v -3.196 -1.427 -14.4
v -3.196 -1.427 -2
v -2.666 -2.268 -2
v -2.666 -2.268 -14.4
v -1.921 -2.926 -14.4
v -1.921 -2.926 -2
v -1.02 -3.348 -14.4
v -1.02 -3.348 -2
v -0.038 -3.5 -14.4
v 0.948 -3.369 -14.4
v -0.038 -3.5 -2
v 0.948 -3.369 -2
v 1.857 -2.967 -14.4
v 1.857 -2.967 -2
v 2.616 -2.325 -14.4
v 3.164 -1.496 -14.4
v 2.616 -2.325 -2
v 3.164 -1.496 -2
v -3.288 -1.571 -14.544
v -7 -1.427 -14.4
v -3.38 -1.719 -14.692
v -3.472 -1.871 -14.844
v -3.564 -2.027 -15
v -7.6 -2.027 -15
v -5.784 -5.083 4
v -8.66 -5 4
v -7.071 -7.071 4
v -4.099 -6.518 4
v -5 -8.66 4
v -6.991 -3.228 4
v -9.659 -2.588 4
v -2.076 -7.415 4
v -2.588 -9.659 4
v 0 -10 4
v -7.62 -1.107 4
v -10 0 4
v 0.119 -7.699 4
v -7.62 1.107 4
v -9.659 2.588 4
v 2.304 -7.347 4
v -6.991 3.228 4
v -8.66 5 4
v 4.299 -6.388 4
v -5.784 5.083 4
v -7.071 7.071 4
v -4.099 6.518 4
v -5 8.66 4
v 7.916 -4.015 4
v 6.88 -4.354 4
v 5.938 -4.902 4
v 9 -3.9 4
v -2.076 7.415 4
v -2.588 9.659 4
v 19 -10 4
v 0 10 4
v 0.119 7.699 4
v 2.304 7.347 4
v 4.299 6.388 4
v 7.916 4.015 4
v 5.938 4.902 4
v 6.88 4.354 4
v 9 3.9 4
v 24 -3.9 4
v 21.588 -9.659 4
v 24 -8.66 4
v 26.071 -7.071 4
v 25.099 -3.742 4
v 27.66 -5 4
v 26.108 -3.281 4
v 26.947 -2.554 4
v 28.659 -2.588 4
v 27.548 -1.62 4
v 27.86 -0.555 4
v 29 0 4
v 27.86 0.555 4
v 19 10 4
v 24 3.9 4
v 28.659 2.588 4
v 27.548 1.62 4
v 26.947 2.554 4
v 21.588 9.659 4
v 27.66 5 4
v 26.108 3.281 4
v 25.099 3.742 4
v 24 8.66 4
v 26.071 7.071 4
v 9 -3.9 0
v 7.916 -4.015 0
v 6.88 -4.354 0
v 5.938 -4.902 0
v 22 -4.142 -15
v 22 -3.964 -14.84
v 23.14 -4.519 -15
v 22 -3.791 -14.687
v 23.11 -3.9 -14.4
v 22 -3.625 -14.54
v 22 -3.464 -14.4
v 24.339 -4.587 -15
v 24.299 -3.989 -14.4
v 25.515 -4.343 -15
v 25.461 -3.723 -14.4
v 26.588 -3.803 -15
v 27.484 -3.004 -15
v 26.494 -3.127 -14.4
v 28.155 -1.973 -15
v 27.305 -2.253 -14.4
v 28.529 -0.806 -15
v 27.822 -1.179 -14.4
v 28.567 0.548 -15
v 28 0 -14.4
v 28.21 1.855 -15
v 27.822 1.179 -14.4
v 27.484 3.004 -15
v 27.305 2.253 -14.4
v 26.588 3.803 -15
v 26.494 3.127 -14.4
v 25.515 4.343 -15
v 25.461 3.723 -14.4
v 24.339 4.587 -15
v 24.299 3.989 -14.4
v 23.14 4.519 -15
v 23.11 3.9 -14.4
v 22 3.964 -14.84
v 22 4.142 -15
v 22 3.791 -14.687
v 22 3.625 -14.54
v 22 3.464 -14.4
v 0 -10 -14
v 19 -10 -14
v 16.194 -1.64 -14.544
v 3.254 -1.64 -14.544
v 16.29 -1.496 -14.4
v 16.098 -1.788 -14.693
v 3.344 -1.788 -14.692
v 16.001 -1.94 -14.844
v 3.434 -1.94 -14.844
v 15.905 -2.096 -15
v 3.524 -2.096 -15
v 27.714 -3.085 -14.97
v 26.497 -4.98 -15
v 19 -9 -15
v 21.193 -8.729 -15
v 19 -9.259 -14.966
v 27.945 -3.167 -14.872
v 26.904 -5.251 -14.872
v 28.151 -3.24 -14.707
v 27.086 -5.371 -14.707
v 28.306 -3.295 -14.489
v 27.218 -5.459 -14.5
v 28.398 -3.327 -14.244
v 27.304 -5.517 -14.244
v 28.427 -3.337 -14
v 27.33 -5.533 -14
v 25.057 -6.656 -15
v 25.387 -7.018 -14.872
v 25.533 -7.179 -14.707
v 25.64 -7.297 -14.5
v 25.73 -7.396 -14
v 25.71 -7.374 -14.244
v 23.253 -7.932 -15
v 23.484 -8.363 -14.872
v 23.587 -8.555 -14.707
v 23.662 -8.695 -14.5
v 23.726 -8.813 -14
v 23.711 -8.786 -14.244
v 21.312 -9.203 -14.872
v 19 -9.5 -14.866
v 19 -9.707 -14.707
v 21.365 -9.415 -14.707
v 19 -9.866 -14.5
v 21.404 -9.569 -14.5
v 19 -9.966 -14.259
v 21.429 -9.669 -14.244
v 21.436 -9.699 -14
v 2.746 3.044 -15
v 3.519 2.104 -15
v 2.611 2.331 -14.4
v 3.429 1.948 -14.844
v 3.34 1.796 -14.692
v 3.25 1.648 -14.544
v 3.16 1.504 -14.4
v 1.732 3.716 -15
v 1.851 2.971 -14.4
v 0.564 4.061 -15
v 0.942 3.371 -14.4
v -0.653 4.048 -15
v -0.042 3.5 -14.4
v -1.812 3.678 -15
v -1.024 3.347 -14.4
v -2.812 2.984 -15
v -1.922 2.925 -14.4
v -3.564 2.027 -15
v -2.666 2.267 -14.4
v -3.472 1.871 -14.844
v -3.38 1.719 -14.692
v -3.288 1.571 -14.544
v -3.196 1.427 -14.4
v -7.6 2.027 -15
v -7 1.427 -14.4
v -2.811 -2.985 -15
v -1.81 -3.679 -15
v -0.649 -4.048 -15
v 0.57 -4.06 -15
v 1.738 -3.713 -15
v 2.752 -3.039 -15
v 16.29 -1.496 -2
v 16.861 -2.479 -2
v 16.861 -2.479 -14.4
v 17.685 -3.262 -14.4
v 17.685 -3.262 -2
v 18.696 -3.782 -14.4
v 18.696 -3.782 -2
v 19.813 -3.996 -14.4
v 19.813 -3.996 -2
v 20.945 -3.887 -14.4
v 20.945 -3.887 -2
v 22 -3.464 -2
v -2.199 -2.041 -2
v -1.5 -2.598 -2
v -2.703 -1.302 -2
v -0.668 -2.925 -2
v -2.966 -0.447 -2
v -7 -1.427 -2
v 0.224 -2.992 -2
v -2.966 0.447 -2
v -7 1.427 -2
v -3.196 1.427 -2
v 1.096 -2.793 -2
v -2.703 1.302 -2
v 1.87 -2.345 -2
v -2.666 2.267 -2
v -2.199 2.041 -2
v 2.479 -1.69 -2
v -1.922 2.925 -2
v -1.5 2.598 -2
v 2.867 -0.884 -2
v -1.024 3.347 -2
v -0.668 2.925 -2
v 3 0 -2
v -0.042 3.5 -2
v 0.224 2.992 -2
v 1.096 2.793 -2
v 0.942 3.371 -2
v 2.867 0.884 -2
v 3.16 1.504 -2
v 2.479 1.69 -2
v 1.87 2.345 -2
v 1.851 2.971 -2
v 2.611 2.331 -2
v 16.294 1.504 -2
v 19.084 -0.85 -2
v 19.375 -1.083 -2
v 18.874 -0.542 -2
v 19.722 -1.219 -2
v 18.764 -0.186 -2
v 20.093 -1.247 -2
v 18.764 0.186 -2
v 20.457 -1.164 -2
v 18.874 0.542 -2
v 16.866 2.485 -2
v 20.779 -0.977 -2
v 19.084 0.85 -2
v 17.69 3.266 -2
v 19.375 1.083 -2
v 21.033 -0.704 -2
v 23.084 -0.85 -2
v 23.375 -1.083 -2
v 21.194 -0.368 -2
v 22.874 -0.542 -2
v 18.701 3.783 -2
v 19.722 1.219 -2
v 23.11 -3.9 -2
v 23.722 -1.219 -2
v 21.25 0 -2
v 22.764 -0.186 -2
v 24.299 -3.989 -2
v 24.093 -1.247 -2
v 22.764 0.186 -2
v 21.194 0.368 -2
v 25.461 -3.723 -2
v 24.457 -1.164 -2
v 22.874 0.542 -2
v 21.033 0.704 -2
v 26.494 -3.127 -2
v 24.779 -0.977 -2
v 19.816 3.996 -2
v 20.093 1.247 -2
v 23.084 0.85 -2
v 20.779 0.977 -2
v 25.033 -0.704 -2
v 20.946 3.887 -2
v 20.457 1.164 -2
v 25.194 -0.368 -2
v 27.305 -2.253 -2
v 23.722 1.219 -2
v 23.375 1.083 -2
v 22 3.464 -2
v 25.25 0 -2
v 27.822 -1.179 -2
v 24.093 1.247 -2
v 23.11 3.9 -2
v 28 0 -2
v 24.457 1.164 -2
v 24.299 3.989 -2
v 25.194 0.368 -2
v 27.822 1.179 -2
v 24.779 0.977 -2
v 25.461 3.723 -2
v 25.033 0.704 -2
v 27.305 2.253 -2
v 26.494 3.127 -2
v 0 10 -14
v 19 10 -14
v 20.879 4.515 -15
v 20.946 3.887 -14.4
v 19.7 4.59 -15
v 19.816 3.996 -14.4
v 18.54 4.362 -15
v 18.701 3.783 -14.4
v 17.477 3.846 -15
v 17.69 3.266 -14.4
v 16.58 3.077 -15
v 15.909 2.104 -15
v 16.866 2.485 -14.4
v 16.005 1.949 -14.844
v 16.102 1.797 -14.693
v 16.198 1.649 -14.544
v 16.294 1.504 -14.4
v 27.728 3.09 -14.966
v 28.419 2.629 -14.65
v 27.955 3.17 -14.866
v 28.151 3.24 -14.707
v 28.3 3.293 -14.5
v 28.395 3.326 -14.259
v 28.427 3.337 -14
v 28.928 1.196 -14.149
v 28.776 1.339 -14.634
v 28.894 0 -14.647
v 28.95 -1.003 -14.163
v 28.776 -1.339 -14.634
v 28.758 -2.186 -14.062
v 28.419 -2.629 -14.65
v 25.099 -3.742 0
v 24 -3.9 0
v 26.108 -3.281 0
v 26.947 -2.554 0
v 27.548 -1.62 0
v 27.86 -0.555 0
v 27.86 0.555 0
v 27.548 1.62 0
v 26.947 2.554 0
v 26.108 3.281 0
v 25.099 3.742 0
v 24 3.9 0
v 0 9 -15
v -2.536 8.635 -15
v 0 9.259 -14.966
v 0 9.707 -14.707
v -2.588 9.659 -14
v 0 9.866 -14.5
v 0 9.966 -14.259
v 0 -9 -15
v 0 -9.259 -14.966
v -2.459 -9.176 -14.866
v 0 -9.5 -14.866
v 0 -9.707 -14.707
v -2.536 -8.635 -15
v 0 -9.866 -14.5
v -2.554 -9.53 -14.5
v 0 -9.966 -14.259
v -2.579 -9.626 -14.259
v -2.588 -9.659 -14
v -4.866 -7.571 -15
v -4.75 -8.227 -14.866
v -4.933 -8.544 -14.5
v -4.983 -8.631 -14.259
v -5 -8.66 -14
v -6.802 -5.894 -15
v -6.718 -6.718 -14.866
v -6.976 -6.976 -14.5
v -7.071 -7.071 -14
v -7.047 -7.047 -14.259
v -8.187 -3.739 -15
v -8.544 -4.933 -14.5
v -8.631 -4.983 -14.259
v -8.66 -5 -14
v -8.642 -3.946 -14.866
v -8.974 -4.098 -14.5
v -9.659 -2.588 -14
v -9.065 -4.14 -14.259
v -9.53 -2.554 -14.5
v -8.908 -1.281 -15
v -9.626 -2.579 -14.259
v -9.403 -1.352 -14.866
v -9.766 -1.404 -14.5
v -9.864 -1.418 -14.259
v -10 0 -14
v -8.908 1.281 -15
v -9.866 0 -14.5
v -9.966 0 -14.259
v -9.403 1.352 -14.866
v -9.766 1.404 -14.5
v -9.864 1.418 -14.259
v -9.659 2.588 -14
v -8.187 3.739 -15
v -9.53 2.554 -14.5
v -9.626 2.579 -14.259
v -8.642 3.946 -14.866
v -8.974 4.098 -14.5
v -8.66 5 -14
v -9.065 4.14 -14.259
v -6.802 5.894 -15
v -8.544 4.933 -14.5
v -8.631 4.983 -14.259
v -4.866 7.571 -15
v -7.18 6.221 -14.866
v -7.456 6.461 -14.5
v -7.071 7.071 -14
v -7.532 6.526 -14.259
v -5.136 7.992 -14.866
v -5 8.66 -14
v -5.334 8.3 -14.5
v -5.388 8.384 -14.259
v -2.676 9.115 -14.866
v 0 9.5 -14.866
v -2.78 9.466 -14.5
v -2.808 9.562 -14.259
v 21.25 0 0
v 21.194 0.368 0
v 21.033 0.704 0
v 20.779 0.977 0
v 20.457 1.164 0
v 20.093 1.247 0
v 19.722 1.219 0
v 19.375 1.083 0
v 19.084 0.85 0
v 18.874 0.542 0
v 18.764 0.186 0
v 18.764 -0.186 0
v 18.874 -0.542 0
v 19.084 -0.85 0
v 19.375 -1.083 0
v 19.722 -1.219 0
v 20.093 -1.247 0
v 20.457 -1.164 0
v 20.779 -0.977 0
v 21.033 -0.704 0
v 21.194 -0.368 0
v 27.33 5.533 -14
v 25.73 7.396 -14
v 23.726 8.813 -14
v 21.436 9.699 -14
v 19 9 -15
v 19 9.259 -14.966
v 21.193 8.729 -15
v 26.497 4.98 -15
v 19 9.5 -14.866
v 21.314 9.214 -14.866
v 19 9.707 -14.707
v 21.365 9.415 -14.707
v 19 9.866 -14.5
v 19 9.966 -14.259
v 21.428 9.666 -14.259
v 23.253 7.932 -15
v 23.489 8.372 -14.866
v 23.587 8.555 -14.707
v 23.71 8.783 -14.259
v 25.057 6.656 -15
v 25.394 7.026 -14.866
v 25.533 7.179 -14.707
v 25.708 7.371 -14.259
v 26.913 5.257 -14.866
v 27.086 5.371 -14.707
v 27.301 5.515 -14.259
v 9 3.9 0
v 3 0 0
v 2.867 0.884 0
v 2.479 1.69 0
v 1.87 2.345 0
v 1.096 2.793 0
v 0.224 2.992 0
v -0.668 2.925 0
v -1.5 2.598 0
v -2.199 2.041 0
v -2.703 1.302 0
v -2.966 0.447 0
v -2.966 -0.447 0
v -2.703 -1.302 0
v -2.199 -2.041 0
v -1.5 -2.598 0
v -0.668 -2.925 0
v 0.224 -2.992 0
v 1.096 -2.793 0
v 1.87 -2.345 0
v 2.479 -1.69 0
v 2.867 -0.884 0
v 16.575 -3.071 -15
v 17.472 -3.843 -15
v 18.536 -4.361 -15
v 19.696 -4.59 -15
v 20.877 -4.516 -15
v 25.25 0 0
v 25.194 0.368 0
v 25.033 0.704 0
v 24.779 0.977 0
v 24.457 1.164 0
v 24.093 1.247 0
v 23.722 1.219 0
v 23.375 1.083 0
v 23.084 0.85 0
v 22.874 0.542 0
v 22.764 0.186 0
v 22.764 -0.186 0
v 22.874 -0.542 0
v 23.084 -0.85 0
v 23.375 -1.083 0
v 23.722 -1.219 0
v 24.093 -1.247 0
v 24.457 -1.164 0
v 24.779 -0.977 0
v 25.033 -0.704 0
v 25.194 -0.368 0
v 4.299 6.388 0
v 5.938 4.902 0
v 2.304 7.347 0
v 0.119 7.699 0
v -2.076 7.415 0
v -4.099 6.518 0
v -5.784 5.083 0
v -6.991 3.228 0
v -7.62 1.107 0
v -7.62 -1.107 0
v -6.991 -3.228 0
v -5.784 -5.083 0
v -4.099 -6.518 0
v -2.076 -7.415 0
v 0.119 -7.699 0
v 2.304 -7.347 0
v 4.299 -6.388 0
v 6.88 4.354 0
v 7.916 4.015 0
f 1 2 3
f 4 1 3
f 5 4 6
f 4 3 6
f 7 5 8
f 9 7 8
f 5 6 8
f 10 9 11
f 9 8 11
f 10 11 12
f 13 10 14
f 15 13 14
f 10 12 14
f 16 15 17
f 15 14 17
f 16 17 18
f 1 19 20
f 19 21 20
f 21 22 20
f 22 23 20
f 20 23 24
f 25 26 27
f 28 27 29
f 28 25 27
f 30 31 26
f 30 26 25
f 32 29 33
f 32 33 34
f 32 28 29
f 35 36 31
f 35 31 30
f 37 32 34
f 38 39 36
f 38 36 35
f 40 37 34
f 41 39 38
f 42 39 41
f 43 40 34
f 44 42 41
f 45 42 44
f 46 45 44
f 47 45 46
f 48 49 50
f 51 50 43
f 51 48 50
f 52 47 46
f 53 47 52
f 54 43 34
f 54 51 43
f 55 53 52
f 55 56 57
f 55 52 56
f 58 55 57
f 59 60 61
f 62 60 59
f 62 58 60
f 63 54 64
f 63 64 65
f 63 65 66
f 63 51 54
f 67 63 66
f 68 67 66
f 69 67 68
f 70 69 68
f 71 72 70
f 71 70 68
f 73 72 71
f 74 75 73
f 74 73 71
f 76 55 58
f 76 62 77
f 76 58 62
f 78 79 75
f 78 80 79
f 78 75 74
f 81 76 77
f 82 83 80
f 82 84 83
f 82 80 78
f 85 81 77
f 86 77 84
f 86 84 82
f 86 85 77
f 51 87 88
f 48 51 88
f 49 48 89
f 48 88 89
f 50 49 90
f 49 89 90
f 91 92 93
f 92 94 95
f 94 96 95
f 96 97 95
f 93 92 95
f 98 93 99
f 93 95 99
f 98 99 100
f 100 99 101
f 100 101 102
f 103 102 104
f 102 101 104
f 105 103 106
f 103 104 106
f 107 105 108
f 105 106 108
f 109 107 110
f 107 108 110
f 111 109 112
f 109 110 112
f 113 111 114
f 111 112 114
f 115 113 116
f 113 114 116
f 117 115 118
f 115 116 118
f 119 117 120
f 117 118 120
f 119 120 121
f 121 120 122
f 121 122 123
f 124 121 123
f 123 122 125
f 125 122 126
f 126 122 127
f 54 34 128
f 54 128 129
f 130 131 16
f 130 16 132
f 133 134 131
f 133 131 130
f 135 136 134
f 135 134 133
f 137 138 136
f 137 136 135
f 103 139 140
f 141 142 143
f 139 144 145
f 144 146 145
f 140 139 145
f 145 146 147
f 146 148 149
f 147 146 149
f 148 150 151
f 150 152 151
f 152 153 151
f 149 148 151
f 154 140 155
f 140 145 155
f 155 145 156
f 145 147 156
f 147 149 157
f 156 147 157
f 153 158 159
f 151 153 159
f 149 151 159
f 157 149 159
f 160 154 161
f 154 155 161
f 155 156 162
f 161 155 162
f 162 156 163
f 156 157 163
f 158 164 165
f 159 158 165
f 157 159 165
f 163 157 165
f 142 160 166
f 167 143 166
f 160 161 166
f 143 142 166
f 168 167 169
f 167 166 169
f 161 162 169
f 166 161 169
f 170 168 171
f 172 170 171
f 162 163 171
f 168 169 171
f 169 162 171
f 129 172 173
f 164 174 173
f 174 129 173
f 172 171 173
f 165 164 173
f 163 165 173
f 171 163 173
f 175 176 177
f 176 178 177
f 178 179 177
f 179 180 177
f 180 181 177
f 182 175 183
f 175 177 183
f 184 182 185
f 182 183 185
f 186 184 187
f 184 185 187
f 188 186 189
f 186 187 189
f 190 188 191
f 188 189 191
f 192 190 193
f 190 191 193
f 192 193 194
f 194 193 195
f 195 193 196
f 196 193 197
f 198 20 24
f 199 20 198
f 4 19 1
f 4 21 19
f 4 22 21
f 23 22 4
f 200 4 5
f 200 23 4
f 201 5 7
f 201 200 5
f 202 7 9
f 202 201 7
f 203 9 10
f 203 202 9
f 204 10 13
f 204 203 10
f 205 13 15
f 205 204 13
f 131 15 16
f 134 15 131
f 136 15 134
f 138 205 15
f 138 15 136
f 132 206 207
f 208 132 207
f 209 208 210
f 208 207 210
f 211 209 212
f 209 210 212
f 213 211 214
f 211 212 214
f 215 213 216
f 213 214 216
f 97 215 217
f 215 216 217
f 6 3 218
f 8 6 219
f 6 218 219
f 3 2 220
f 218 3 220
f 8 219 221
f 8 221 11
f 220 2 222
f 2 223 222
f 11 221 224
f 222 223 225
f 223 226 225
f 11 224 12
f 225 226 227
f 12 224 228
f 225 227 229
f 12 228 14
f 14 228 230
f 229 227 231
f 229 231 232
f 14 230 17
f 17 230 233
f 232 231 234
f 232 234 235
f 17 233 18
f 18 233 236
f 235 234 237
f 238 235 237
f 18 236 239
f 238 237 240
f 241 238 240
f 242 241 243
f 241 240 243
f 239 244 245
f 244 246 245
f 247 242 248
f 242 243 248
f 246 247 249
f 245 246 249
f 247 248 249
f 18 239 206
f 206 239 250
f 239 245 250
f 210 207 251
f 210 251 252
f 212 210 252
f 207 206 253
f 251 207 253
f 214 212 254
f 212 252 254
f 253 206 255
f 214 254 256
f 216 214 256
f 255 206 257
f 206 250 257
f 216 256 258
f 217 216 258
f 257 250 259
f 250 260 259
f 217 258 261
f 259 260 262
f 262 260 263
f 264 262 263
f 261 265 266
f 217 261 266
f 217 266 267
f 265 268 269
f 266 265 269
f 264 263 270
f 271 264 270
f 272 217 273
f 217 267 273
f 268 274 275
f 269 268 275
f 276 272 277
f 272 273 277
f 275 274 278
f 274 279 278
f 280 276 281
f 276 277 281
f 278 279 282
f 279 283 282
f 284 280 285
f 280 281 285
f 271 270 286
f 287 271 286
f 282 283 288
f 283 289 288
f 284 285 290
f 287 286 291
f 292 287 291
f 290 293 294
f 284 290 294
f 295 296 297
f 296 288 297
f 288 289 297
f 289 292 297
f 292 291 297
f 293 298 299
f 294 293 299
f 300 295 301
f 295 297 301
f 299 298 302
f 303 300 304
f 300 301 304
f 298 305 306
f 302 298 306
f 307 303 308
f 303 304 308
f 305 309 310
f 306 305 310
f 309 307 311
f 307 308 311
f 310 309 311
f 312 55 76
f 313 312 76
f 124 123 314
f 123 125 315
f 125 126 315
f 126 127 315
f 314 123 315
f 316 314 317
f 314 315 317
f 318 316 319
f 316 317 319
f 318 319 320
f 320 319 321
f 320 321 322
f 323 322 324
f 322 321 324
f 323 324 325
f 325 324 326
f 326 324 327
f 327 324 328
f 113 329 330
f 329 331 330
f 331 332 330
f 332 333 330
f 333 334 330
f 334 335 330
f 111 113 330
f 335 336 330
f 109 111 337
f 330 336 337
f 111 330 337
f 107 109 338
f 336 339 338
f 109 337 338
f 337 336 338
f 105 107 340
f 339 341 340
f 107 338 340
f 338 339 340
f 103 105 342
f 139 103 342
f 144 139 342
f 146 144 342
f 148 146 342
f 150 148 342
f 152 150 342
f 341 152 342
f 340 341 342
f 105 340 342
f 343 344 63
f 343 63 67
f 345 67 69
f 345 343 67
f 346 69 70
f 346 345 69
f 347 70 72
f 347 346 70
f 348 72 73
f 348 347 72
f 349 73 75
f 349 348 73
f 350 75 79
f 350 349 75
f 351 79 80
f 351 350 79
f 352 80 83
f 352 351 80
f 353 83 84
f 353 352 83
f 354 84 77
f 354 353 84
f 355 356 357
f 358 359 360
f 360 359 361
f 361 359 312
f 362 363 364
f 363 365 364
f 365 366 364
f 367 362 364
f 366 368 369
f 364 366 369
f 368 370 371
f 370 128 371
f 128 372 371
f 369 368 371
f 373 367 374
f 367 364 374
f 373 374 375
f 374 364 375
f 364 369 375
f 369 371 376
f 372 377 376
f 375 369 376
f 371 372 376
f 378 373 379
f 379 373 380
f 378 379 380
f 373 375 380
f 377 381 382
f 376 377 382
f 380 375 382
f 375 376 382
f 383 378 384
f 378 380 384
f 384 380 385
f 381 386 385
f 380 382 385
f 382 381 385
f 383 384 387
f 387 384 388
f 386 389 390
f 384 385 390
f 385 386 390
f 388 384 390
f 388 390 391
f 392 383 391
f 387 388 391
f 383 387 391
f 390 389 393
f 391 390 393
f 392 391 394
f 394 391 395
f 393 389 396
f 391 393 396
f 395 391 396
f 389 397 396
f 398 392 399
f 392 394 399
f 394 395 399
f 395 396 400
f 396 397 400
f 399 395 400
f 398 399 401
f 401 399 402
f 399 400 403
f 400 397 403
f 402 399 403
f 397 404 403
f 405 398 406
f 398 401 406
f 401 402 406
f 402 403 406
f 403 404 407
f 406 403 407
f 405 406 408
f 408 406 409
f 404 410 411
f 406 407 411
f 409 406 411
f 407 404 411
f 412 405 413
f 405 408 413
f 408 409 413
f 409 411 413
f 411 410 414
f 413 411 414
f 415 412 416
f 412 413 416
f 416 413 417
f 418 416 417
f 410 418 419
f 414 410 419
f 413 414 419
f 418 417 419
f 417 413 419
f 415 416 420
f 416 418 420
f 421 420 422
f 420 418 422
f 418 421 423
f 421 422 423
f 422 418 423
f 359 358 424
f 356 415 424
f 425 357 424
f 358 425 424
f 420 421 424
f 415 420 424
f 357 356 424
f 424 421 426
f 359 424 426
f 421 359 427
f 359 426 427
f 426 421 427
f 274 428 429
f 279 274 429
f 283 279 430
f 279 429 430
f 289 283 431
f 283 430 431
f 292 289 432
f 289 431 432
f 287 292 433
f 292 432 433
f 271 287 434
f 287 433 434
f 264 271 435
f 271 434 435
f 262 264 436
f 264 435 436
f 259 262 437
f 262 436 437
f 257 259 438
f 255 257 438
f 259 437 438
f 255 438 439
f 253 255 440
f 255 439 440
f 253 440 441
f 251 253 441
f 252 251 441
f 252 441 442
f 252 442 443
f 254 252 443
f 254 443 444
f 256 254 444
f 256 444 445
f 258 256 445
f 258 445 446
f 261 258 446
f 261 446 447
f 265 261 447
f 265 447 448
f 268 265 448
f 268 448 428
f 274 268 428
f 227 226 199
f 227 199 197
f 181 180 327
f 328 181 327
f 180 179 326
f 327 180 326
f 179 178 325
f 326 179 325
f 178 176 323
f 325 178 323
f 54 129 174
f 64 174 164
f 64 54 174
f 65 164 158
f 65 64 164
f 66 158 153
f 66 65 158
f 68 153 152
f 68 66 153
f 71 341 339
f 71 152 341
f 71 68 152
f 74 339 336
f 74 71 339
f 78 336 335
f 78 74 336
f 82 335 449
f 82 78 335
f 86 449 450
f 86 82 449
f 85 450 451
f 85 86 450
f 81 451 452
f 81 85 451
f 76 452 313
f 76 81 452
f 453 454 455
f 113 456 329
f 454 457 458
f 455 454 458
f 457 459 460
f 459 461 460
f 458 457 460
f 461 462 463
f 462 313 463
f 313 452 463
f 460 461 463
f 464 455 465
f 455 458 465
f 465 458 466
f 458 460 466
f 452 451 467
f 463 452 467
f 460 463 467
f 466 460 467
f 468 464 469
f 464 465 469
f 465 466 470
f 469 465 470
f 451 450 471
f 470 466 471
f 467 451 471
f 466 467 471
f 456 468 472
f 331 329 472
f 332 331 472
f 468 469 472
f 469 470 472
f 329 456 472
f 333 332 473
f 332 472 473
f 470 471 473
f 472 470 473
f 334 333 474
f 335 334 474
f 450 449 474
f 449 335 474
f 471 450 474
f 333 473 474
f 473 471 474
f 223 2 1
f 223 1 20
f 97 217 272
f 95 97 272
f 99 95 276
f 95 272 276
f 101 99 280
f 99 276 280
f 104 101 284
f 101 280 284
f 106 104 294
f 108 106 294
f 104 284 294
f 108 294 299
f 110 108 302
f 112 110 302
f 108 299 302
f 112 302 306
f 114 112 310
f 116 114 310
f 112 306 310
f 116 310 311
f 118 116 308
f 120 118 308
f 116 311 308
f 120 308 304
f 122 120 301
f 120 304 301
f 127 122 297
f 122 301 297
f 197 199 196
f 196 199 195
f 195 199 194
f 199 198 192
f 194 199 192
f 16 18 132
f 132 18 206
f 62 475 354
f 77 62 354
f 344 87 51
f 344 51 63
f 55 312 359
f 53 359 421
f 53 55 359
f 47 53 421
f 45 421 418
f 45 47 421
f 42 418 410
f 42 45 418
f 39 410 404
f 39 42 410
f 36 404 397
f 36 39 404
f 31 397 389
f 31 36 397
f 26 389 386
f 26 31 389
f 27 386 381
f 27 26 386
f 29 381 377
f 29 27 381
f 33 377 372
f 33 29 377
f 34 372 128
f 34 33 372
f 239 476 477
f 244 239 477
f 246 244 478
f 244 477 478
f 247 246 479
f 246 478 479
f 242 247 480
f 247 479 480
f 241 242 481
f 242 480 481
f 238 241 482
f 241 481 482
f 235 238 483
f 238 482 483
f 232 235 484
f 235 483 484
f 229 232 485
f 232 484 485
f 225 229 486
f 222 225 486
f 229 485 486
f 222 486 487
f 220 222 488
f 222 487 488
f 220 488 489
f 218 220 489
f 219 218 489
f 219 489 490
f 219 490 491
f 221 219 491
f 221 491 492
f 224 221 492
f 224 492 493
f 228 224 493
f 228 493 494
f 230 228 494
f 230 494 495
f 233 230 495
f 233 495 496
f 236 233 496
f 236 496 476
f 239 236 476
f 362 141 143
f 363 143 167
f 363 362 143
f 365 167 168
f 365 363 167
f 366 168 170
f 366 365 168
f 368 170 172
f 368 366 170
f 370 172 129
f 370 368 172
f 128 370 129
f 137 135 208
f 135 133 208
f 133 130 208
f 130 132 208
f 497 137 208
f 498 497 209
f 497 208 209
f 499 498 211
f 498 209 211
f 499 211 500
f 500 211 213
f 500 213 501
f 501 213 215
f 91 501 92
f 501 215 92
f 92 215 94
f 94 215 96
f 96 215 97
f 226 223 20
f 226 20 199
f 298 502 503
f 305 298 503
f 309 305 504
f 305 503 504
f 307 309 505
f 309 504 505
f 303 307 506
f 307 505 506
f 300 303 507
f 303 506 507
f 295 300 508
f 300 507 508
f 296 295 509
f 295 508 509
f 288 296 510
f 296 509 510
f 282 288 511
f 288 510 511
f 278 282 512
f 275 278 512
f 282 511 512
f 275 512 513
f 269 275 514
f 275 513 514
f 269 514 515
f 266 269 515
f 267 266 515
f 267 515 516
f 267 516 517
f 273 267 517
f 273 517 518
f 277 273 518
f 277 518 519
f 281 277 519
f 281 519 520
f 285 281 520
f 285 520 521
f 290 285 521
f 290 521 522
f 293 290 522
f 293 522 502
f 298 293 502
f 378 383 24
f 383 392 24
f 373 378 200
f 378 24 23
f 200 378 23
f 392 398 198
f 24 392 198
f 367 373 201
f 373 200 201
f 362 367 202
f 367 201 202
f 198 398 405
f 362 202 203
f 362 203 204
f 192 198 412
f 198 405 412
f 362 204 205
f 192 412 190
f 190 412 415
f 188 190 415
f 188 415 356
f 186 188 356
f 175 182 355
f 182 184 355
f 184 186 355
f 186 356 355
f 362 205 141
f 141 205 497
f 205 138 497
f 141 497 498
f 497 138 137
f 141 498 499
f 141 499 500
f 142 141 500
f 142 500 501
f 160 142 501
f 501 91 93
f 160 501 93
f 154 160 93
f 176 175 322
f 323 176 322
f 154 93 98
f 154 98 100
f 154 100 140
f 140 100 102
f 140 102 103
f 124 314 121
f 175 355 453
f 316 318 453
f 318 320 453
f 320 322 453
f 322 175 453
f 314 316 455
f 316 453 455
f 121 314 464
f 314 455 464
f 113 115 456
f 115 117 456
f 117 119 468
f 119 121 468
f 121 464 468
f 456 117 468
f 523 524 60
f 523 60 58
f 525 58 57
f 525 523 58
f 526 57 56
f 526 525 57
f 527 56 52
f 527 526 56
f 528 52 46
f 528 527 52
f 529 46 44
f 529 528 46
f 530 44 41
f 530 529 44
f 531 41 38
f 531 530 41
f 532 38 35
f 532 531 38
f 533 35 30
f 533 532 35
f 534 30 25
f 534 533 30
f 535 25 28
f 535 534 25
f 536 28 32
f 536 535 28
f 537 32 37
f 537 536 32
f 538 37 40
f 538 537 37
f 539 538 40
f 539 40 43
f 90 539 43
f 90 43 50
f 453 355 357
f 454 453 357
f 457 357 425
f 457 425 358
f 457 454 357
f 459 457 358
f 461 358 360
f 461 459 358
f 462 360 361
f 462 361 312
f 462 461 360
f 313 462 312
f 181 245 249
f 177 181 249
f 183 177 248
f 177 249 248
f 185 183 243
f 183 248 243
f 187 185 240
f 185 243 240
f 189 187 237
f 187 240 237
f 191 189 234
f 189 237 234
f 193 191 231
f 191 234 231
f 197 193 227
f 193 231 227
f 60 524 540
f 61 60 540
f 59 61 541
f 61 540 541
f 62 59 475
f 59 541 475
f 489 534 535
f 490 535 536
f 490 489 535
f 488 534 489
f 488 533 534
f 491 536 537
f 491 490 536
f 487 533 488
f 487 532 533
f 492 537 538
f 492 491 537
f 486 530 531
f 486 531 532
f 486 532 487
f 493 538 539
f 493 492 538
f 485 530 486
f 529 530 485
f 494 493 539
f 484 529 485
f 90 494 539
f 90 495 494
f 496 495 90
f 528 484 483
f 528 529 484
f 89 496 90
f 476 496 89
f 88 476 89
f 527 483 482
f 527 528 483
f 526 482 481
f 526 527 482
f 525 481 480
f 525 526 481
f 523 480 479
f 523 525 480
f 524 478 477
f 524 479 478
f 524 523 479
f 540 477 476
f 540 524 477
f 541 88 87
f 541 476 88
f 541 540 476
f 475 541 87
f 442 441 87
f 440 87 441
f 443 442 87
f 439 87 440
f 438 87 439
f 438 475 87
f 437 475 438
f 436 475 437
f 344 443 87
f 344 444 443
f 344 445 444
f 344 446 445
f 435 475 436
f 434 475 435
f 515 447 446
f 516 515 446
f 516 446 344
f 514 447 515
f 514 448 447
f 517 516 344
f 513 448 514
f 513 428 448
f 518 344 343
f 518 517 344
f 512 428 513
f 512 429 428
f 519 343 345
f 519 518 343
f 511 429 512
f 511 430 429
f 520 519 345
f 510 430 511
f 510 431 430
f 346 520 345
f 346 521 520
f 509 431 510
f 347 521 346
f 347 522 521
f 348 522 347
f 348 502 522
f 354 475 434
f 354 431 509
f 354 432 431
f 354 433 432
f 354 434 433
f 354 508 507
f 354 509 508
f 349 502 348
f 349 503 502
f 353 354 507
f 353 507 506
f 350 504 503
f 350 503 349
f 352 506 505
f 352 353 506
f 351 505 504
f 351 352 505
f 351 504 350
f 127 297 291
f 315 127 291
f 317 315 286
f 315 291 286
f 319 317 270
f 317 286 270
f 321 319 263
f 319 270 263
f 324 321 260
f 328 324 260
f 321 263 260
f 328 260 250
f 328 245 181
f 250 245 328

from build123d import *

# Parameters (mm, degrees)
PAD_DEPTH       = 4
PAD001_DEPTH    = 2
SKETCH002_R     = 3
SKETCH002_R_2   = 1.25
POCKET_DEPTH    = 2.001
PAD002_DEPTH    = 13
CHAMFER_SIZE    = 0.6
CHAMFER001_SIZE = 0.6
CHAMFER002_SIZE = 0.6
CHAMFER003_SIZE = 0.6
FILLET_R        = 1


with BuildPart() as part:
    # Sketch → Pad (new body)
    with BuildSketch(Plane.XY):
        with BuildLine():
            ThreePointArc((0, 10), (-10, 0), (0, -10))
            Line((0, -10), (19, -10))
            ThreePointArc((19, -10), (29, 0), (19, 10))
            Line((0, 10), (19, 10))
        make_face()
        with BuildLine():
            Line((9, 3.9), (24, 3.9))
            ThreePointArc((24, -3.9), (27.9, 0), (24, 3.9))
            Line((9, -3.9), (24, -3.9))
            ThreePointArc((9, -3.9), (7.389325, -4.156777), (5.938336, -4.90165))
            ThreePointArc((5.938336, 4.90165), (-7.7, 0), (5.938336, -4.90165))
            ThreePointArc((5.938336, 4.90165), (7.389325, 4.156777), (9, 3.9))
        make_face(mode=Mode.SUBTRACT)
    extrude(amount=PAD_DEPTH)

    # Sketch001 → Pad001 (join)
    with BuildSketch(Plane.XY):
        with BuildLine():
            ThreePointArc((0, 10), (-10, 0), (0, -10))
            Line((0, -10), (19, -10))
            ThreePointArc((19, -10), (29, 0), (19, 10))
            Line((0, 10), (19, 10))
        make_face()
    extrude(amount=-PAD001_DEPTH)

    # Sketch002 → Pocket (cut, through all)
    with BuildSketch(Plane.XY):
        Circle(SKETCH002_R)
        with Locations((24, 0)):
            Circle(SKETCH002_R_2)
        with Locations((20, 0)):
            Circle(SKETCH002_R_2)
    extrude(amount=-POCKET_DEPTH, mode=Mode.SUBTRACT)

    # Sketch003 → Pad002 (join)
    with BuildSketch(Plane.XY.offset(-2)):
        with BuildLine():
            ThreePointArc((0, 10), (-10, 0), (0, -10))
            Line((0, -10), (19, -10))
            ThreePointArc((19, -10), (29, 0), (19, 10))
            Line((0, 10), (19, 10))
        make_face()
        with BuildLine():
            Line((-7, -1.427009), (-7, 1.427009))
            Line((-7, 1.427009), (-3.195879, 1.427009))
            ThreePointArc((3.160298, 1.504166), (-0.042483, 3.499742), (-3.195879, 1.427009))
            Line((3.160298, 1.504166), (16.293582, 1.504166))
            ThreePointArc((22.000011, 3.464103), (18.700656, 3.783088), (16.293582, 1.504166))
            ThreePointArc((22.000011, -3.464103), (27.999995, 0), (22.000011, 3.464103))
            ThreePointArc((16.290212, -1.495834), (18.696407, -3.781626), (22.000011, -3.464103))
            Line((3.16425, -1.495834), (16.290212, -1.495834))
            ThreePointArc((-3.195879, -1.427009), (-0.037873, -3.499795), (3.16425, -1.495834))
            Line((-3.195879, -1.427009), (-7, -1.427009))
        make_face(mode=Mode.SUBTRACT)
    extrude(amount=-PAD002_DEPTH)

    # Chamfer
    chamfer_edges = [part.edges().sort_by_distance(p)[0] for p in [
        (9.727231, -1.495834, -15),
        (9.72694, 1.504166, -15),
    ]]
    chamfer(chamfer_edges, length=CHAMFER_SIZE)

    # Chamfer001
    chamfer001_edges = [part.edges().sort_by_distance(p)[0] for p in [
        (19.018709, -3.877772, -15),
        (27.999995, 0, -15),
        (19.023455, 3.87897, -15),
        (-0.392985, 3.477868, -15),
        (-0.387811, -3.478448, -15),
    ]]
    chamfer(chamfer001_edges, length=CHAMFER001_SIZE)

    # Chamfer002
    chamfer002_edges = [part.edges().sort_by_distance(p)[0] for p in [
        (-5.421825, -1.427009, -15),
    ]]
    chamfer(chamfer002_edges, length=CHAMFER002_SIZE)

    # Chamfer003
    chamfer003_edges = [part.edges().sort_by_distance(p)[0] for p in [
        (-5.421825, 1.427009, -15),
        (-7, 0, -15),
        (-7, -1.727009, -15),
    ]]
    chamfer(chamfer003_edges, length=CHAMFER003_SIZE)

    # Fillet
    fillet_edges = [part.edges().sort_by_distance(p)[0] for p in [
        (9.5, 10, -15),
        (29, 0, -15),
        (9.5, -10, -15),
        (-10, 0, -15),
    ]]
    fillet(fillet_edges, radius=FILLET_R)


solid = part.part
